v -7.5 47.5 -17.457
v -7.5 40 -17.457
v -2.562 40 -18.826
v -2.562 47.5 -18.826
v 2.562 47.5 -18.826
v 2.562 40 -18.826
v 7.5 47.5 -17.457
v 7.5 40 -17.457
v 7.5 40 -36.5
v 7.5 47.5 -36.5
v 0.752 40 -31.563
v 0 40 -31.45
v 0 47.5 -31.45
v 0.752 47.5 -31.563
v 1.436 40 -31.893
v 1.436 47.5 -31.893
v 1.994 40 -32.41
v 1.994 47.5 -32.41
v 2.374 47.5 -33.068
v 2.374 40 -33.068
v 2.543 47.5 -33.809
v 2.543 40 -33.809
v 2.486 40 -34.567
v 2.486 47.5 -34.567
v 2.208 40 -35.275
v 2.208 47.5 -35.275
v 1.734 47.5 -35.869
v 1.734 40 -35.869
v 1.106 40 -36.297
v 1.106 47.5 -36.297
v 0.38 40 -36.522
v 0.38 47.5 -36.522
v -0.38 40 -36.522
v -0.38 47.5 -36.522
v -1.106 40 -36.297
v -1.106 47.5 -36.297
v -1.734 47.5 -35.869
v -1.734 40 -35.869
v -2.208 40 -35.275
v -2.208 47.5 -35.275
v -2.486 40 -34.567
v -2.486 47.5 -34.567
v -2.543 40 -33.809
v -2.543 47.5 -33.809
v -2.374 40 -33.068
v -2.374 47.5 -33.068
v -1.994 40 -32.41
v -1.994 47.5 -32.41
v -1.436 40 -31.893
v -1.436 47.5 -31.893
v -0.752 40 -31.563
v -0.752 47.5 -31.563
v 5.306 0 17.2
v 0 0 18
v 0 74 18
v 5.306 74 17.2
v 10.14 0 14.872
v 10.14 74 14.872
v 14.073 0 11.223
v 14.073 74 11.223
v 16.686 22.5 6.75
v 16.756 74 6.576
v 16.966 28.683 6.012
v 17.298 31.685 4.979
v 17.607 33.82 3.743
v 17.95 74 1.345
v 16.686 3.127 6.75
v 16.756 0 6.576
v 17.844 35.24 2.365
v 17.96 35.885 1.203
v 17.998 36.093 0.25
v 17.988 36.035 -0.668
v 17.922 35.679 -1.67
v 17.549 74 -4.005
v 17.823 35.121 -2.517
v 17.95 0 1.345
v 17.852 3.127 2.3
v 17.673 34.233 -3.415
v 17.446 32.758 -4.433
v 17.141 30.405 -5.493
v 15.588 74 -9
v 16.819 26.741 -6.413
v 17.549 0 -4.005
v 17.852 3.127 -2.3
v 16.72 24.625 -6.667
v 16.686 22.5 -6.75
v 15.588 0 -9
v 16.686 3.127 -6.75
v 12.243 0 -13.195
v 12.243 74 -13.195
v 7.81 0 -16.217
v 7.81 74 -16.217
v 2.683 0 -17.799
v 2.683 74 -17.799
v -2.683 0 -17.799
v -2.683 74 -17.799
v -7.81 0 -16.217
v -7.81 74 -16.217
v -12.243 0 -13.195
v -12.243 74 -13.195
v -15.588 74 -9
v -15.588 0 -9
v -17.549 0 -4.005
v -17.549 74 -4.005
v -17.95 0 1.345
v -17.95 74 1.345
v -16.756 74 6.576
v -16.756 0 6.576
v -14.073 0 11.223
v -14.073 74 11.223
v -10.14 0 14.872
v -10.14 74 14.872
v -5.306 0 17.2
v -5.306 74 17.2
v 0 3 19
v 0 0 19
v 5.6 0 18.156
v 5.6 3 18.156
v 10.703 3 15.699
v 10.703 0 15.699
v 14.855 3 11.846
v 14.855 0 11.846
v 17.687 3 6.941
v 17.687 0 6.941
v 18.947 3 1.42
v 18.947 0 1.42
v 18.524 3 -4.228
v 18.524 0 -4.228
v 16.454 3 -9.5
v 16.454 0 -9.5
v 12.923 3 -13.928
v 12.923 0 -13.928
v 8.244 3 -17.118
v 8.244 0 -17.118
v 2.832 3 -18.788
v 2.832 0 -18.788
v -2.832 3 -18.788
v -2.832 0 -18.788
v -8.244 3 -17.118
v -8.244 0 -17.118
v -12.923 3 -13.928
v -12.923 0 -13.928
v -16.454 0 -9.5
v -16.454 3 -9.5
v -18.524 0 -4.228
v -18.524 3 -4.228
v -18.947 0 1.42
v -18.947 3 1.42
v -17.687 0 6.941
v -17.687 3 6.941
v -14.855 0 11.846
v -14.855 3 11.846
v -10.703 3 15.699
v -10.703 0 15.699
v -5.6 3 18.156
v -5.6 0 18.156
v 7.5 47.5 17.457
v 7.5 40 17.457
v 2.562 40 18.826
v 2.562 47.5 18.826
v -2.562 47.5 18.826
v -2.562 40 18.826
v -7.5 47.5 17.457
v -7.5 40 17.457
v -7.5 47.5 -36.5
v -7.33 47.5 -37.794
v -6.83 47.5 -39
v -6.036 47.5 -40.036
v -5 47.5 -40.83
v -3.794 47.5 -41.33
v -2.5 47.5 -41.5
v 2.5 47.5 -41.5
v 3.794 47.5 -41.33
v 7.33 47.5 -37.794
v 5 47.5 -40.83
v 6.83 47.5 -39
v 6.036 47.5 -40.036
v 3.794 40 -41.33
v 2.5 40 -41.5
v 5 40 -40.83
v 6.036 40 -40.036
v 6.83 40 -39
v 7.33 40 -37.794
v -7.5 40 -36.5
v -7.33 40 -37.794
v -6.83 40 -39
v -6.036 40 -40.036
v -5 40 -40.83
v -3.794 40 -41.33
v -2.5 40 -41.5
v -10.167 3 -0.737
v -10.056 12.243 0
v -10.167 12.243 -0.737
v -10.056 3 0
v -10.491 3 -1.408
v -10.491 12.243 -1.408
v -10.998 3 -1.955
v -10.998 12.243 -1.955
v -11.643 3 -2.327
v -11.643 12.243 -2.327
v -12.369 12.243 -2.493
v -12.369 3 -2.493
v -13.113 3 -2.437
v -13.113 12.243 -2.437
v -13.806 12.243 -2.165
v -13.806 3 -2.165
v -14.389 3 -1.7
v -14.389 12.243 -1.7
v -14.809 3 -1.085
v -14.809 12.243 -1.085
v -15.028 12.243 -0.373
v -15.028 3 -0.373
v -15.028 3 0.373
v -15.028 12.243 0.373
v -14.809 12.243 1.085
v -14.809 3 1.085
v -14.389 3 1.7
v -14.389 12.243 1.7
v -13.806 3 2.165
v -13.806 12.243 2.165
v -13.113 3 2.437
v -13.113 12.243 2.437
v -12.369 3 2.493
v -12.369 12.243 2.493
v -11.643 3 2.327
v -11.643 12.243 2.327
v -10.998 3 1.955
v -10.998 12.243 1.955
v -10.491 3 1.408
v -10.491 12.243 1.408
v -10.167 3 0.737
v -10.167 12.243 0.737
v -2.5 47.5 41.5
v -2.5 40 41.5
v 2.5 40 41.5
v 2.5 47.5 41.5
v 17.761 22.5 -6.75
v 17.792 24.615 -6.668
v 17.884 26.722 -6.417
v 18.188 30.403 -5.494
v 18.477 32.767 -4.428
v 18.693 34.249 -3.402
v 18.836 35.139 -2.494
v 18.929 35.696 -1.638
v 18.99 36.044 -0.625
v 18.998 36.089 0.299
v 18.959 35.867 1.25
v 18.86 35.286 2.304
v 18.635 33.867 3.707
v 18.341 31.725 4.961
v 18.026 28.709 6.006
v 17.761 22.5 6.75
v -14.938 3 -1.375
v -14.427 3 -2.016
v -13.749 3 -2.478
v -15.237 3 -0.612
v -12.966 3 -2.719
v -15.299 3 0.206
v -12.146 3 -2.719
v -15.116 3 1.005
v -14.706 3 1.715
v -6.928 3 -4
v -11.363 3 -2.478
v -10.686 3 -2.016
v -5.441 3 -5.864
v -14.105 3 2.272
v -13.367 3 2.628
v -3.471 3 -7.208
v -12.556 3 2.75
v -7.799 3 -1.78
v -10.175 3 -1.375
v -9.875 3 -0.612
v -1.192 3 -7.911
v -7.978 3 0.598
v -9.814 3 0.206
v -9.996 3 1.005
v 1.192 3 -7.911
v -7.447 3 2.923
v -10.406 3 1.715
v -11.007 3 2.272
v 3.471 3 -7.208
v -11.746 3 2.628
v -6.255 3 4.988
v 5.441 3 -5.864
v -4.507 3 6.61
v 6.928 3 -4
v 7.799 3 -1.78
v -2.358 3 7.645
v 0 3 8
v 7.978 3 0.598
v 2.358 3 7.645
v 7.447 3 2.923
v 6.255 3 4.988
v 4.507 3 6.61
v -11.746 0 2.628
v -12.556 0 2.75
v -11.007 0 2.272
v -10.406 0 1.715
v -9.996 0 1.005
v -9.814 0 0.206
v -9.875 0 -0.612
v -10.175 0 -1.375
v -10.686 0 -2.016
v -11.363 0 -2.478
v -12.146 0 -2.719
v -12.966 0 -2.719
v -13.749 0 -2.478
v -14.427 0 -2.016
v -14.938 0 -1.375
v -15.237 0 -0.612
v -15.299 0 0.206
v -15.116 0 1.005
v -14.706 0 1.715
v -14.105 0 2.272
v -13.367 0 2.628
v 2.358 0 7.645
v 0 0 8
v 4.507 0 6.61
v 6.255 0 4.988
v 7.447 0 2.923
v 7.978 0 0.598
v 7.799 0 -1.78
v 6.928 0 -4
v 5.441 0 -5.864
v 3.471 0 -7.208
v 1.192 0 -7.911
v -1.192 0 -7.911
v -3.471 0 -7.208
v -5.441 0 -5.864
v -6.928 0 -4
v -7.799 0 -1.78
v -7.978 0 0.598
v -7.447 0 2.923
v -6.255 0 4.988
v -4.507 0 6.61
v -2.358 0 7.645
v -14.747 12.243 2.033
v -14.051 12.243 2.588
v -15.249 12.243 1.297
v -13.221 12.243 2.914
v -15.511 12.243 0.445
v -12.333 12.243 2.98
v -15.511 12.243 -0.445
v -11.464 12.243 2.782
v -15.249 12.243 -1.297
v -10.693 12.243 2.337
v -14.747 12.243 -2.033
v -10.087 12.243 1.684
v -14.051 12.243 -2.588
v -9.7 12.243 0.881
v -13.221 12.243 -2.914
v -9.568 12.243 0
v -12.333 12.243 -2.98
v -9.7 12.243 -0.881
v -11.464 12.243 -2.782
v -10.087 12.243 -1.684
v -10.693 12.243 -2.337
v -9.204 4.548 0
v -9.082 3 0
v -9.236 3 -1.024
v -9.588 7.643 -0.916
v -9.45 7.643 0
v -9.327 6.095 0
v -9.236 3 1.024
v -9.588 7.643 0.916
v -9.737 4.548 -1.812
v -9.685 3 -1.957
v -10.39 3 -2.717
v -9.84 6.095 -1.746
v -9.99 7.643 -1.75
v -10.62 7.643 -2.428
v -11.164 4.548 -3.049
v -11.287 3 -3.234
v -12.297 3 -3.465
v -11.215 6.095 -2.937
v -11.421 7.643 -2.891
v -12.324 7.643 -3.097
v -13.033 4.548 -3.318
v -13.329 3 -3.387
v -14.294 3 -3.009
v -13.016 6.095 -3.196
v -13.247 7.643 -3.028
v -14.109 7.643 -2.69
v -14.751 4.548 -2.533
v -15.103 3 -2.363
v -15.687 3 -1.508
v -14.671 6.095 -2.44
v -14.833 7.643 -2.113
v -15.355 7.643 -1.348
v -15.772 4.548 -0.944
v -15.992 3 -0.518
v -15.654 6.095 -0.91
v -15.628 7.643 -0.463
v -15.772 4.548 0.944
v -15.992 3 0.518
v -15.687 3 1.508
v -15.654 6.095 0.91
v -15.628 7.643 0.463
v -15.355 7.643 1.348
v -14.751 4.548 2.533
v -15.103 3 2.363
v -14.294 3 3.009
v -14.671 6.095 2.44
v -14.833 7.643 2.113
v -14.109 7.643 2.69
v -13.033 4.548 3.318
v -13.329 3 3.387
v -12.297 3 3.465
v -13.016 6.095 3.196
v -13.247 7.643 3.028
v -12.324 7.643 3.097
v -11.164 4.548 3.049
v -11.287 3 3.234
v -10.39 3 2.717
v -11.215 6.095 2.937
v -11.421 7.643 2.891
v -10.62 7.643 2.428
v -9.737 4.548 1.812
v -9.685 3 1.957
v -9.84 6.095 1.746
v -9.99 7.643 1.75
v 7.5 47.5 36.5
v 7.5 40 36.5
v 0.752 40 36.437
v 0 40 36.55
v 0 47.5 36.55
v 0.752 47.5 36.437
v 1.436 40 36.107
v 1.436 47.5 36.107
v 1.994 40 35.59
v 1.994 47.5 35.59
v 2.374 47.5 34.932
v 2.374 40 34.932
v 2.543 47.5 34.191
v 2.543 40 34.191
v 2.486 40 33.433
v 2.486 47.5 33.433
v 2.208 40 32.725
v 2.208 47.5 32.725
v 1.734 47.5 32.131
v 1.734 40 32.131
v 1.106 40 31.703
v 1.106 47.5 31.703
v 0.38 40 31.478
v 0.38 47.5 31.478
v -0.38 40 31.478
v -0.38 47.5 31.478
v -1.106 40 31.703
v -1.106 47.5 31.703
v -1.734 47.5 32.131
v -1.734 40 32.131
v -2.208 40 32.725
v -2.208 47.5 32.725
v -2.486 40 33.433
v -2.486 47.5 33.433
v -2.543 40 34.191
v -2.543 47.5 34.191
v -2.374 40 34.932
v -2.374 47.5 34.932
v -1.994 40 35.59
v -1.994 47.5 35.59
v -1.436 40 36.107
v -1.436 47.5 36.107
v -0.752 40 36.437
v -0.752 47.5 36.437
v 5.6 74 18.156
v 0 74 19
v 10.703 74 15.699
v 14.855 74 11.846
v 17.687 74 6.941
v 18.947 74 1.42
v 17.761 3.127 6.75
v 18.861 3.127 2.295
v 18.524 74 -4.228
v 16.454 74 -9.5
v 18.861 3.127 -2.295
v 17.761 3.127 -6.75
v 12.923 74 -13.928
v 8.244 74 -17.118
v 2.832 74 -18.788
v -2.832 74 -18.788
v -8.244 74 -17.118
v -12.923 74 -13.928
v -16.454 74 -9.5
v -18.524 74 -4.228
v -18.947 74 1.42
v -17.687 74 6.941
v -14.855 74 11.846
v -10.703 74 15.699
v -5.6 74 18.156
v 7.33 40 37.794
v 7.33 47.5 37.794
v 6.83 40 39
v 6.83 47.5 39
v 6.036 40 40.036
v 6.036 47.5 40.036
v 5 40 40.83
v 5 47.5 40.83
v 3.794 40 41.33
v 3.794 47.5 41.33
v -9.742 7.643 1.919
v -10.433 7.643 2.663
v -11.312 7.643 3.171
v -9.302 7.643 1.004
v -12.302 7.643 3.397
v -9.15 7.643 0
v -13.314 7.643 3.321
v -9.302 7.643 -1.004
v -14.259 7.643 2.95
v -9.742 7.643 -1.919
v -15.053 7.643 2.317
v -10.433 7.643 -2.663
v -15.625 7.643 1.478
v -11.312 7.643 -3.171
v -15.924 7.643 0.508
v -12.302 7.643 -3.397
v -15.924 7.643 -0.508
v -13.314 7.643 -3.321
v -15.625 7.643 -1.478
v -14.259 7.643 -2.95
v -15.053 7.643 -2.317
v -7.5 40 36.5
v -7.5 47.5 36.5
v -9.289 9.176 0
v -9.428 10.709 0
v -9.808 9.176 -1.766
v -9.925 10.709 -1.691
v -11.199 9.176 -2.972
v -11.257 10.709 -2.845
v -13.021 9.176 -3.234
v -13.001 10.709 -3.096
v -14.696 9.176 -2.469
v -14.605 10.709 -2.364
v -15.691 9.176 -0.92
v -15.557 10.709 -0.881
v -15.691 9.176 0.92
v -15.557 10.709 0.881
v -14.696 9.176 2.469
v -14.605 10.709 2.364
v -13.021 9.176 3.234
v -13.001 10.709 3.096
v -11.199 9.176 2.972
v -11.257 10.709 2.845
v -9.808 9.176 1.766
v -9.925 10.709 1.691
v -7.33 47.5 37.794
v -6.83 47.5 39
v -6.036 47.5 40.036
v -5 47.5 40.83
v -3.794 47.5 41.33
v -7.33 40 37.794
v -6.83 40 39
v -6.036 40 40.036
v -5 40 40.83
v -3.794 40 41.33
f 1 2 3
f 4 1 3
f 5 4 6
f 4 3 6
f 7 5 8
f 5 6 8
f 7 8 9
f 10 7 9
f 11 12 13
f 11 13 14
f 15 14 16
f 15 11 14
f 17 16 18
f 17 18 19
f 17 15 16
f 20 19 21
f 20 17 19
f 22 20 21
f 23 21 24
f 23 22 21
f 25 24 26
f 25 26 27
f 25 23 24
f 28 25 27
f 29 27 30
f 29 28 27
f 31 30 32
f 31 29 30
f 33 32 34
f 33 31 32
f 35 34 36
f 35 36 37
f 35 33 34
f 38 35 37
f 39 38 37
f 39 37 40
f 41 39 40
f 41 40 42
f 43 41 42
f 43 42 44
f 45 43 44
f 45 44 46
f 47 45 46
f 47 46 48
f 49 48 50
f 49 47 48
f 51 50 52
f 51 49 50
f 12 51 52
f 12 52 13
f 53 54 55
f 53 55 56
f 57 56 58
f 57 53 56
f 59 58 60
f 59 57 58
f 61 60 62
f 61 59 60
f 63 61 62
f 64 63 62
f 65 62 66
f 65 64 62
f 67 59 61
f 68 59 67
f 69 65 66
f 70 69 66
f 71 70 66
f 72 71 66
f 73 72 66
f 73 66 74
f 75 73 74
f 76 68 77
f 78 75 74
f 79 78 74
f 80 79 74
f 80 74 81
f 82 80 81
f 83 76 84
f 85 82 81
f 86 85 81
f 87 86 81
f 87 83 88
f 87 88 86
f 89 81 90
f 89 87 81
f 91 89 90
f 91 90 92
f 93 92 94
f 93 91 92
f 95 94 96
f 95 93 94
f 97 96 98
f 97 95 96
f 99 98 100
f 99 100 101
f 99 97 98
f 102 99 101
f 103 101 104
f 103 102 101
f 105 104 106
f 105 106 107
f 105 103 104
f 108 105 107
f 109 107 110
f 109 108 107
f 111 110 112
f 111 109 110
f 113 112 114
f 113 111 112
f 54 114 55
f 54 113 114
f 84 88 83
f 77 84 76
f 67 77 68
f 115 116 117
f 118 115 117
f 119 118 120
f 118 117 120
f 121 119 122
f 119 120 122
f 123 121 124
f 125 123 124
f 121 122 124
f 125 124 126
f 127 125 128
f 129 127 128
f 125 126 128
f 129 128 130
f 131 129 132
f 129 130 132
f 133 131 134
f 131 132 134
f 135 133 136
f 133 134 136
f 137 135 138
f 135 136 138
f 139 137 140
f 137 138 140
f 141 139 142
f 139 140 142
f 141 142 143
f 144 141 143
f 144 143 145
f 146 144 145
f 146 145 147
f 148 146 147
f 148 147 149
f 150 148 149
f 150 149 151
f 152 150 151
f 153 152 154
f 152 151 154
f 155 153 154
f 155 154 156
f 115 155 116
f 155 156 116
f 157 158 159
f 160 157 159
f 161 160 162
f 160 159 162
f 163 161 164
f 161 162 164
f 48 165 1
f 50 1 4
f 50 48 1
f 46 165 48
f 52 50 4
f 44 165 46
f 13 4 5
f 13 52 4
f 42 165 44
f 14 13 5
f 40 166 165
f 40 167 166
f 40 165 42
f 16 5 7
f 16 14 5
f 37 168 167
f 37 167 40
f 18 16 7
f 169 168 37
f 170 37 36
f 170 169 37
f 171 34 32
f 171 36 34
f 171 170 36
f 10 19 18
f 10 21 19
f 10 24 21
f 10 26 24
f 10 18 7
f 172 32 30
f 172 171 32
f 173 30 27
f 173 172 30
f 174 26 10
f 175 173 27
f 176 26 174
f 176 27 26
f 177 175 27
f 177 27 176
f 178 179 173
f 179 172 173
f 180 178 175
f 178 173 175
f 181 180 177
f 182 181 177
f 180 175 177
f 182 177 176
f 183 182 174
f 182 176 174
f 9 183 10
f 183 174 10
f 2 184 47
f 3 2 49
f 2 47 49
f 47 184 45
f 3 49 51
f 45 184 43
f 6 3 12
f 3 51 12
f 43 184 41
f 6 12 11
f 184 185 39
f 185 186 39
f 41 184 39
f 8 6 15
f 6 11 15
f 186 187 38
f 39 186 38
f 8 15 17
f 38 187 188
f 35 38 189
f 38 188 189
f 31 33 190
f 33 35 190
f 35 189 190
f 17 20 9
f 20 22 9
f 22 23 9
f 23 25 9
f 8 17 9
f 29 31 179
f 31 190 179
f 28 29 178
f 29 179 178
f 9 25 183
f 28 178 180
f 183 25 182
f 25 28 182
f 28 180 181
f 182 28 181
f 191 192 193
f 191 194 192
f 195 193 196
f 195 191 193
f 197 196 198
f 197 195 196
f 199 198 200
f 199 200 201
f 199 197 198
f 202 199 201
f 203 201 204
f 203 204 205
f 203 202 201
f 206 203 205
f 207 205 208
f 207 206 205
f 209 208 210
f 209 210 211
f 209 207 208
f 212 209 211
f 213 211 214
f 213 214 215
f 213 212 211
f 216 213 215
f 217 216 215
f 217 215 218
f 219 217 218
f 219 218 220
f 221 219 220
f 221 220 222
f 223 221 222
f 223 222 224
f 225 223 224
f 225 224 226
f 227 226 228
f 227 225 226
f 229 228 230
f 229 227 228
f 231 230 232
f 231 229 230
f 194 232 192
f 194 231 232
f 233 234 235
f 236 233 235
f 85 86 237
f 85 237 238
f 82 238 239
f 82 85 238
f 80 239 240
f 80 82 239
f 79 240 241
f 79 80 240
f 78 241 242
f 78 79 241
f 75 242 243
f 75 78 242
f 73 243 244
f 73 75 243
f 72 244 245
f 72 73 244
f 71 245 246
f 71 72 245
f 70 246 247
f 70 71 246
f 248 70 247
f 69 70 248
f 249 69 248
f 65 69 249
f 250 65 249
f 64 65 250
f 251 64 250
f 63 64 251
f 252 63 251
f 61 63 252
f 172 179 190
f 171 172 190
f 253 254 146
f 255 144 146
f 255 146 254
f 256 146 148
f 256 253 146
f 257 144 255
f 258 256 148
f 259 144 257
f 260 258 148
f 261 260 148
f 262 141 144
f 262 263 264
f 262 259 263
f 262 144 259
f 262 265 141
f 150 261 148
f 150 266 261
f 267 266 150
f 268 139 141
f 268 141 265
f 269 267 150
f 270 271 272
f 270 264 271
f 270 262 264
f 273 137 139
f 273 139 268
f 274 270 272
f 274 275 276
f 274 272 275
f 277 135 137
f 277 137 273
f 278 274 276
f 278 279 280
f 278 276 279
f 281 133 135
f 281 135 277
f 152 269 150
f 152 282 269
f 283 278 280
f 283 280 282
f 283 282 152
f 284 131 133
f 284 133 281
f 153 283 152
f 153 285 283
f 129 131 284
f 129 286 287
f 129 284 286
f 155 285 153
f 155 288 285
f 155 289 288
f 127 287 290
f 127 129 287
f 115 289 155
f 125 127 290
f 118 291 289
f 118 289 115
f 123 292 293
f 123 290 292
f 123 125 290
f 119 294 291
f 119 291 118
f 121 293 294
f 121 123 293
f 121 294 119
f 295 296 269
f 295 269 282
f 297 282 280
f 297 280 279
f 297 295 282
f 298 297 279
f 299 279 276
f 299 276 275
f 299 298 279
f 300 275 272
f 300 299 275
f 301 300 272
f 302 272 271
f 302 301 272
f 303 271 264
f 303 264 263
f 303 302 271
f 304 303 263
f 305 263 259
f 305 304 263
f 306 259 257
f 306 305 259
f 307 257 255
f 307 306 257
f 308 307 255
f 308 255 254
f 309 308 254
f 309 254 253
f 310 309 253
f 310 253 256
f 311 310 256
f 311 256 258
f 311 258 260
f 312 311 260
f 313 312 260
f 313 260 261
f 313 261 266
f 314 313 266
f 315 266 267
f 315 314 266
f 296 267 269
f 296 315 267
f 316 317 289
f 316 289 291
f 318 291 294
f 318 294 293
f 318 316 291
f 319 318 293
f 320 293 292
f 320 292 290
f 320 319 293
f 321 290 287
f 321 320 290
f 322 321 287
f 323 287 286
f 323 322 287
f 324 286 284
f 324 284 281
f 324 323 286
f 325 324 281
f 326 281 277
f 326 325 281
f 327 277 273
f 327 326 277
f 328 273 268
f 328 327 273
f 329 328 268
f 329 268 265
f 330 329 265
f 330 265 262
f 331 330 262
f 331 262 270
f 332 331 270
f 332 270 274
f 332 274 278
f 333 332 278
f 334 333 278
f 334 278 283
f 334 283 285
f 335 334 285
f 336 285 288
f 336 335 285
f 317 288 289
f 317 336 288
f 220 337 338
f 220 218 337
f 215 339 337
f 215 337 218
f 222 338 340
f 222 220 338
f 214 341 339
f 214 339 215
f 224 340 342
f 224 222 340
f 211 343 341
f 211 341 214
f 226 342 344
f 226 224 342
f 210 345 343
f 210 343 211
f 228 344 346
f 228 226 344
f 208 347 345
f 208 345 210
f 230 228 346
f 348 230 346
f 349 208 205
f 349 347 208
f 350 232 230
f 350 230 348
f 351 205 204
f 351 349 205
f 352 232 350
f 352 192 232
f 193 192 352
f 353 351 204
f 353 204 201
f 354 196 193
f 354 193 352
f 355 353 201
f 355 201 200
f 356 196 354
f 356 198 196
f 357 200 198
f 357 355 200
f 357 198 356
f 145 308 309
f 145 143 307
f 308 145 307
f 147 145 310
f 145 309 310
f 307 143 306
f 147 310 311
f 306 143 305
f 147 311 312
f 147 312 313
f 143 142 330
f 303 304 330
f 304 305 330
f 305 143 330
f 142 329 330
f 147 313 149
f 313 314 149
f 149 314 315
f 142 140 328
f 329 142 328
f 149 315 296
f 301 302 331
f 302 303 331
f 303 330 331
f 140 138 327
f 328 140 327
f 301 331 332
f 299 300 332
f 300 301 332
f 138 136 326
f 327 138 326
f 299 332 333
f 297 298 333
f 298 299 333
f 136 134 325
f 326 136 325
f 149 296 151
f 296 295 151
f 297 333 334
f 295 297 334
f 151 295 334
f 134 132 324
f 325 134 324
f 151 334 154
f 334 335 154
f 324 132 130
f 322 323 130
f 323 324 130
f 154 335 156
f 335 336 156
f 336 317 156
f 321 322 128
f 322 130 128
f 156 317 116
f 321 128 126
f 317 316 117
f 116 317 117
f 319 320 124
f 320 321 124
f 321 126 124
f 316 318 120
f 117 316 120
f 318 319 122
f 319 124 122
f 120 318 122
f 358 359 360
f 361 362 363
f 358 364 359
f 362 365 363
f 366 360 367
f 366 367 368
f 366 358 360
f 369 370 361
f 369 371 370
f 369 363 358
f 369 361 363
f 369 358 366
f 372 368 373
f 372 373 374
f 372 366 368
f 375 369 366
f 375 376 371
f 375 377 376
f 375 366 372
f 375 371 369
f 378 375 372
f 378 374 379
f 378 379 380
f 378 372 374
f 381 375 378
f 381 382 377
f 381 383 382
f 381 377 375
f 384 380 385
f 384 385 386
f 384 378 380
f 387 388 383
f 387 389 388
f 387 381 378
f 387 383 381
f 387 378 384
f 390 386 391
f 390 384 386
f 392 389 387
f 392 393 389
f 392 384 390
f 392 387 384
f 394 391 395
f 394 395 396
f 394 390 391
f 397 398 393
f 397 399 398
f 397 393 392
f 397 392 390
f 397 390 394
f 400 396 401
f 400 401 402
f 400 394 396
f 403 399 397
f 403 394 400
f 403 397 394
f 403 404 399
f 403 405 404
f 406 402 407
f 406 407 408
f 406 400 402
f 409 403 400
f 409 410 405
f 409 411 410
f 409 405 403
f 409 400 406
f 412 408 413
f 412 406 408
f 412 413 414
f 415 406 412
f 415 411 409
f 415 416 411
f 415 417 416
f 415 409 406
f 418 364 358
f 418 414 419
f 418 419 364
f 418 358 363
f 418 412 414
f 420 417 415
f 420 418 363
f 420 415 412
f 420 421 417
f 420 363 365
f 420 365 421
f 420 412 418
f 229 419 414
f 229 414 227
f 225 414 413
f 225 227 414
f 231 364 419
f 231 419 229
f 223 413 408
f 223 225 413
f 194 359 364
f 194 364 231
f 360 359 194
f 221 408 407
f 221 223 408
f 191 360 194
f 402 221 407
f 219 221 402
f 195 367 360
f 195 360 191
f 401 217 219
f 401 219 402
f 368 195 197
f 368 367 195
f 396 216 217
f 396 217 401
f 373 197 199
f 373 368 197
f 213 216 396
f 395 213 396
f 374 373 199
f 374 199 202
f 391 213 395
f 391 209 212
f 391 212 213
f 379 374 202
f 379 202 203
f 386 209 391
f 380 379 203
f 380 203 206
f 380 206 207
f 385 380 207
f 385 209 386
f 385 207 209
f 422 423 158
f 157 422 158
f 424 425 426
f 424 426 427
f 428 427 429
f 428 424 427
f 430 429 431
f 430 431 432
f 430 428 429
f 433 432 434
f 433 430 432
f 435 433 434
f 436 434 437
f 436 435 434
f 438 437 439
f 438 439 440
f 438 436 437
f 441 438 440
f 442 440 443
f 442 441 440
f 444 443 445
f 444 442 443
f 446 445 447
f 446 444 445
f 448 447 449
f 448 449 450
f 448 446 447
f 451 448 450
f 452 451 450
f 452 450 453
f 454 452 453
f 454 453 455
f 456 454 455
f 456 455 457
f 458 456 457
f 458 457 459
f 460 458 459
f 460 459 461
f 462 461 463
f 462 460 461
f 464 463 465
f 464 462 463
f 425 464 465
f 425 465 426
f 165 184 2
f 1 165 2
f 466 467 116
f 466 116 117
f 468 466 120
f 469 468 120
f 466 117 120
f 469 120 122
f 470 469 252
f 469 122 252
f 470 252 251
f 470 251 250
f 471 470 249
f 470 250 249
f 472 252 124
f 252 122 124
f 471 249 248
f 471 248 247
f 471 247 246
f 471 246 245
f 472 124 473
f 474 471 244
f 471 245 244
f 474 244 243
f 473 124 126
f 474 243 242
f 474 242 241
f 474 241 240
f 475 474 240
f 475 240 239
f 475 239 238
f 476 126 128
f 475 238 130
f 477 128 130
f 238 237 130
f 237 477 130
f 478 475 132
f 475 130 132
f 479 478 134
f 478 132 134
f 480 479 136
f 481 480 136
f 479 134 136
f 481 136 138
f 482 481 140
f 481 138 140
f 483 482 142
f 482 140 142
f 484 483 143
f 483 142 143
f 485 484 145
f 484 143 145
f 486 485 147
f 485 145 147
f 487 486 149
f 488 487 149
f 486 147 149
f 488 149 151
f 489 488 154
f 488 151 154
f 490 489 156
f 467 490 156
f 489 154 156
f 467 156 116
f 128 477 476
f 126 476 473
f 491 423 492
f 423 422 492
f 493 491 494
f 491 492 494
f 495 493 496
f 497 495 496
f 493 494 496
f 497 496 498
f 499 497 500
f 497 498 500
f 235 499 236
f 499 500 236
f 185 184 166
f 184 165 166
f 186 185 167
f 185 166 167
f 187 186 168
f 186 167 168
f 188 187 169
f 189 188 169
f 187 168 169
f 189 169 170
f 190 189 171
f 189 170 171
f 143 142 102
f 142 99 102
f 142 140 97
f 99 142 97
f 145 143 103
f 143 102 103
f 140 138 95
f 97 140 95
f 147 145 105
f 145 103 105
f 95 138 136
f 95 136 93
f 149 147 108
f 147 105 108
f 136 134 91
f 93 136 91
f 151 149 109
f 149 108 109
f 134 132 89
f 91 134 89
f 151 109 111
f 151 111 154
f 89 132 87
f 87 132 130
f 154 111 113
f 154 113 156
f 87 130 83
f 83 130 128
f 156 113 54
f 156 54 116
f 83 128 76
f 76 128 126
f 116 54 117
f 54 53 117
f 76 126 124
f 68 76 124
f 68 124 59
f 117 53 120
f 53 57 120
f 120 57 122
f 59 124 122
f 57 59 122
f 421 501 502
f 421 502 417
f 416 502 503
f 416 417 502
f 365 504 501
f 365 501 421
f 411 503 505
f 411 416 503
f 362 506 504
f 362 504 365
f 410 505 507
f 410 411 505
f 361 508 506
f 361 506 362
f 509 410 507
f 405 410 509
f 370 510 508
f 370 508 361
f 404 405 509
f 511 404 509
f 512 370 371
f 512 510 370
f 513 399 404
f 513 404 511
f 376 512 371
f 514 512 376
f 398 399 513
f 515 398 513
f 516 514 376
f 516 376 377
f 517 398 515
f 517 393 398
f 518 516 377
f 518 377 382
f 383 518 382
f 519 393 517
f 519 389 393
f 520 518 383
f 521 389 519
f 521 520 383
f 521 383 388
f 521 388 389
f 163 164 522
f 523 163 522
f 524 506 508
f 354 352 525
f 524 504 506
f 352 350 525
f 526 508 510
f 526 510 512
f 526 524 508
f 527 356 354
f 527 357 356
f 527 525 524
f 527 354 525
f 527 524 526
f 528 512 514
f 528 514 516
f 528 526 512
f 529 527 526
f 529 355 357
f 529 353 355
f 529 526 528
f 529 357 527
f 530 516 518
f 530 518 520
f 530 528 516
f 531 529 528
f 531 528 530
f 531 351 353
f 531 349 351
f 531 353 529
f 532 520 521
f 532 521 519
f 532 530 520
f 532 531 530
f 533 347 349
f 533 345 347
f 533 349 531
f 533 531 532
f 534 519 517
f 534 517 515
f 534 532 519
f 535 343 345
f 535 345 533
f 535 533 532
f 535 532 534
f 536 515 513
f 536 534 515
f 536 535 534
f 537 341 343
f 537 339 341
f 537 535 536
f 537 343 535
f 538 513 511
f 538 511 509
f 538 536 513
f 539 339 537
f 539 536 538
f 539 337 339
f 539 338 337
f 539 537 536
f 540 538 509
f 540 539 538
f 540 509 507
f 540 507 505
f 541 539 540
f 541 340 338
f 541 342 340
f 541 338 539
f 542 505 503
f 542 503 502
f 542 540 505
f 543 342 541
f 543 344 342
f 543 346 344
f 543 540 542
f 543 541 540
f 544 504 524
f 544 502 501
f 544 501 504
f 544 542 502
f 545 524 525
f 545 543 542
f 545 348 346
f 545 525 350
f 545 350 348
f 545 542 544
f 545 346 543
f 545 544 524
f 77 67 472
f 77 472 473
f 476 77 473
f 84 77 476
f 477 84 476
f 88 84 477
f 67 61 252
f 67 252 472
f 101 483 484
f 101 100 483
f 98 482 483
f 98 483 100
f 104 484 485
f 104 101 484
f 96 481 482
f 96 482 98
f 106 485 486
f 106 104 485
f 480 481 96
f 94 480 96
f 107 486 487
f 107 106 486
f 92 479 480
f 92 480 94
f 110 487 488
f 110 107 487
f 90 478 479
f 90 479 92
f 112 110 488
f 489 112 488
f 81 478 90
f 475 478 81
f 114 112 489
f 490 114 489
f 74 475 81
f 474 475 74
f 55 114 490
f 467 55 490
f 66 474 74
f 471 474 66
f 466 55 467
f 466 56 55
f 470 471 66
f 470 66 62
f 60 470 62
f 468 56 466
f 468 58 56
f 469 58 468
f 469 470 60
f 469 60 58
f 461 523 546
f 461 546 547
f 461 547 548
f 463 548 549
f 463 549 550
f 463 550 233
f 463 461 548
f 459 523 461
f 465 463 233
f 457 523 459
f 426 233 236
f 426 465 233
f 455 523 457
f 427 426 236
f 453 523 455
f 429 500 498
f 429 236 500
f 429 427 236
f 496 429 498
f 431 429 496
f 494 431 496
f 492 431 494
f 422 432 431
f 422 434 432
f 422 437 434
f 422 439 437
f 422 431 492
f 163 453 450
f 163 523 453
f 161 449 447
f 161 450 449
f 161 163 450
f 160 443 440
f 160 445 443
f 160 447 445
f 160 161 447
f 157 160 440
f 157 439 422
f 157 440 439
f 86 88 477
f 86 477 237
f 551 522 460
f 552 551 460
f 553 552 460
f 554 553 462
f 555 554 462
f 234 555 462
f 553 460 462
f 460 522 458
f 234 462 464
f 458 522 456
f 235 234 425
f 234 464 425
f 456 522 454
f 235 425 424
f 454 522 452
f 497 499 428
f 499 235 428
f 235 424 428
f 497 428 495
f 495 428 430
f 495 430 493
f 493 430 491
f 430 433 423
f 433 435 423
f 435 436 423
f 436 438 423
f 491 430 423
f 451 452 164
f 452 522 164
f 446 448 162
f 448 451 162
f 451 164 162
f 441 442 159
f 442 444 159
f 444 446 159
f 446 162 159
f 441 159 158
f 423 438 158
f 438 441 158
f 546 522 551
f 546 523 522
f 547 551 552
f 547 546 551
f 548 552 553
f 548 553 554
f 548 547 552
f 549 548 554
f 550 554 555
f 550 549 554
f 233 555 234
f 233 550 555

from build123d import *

# Parameters (mm, degrees)
SKETCH1_R             = 19
SKETCH1_R_2           = 2.75
SKETCH1_R_3           = 8
BOSS_EXTRUDE1_DEPTH   = 3
SKETCH1_5_R           = 19
SKETCH1_5_R_2         = 18
BOSS_EXTRUDE2_DEPTH   = 74
CUT_EXTRUDE1_DEPTH    = 79.727377703
SKETCH3_R             = 2.55
BOSS_EXTRUDE3_DEPTH   = 7.5
BOSS_EXTRUDE3_2_DEPTH = 7.5
BODY_MOVE_COPY1_ANGLE = 90
FILLET3_R             = 5
FILLET4_R             = 5


with BuildPart() as part:
    # Sketch1 → Boss-Extrude1 (new body)
    with BuildSketch(Plane(origin=(0, 0, 0), x_dir=(1, 0, 0), z_dir=(0, 1, 0))):
        with Locations(Location((0, 0, 0), (0, 0, 270))):
            Circle(SKETCH1_R)
        with Locations(Location((-12.55625, 0, 0), (0, 0, 270))):
            Circle(SKETCH1_R_2, mode=Mode.SUBTRACT)
        with Locations(Location((0, 0, 0), (0, 0, 270))):
            Circle(SKETCH1_R_3, mode=Mode.SUBTRACT)
    extrude(amount=BOSS_EXTRUDE1_DEPTH)


with BuildPart() as body_2:
    # Sketch1<5> → Boss-Extrude2 (new body)
    with BuildSketch(Plane(origin=(0, 0, 0), x_dir=(1, 0, 0), z_dir=(0, 1, 0))):
        with Locations(Location((0, 0, 0), (0, 0, 270))):
            Circle(SKETCH1_5_R)
        with Locations(Location((0, 0, 0), (0, 0, 270))):
            Circle(SKETCH1_5_R_2, mode=Mode.SUBTRACT)
    extrude(amount=BOSS_EXTRUDE2_DEPTH)

    # Sketch2 → Cut-Extrude1 (cut, through all)
    with BuildSketch(Plane(origin=(0, 0, 0), x_dir=(0, 0, -1), z_dir=(1, 0, 0))):
        with BuildLine():
            Line((-6.75, 22.5), (-6.75, 3.126681013))
            Line((-6.75, 3.126681013), (6.75, 3.126681013))
            Line((6.75, 3.126681013), (6.75, 22.5))
            add(Edge.make_bspline(
                [(6.75, 22.5), (6.75, 36.102227394), (0, 36.102227394), (-6.75, 36.102227394), (-6.75, 22.5)],
                knots=[4.71238898, 4.71238898, 4.71238898, 6.283185307, 6.283185307, 7.853981634, 7.853981634, 7.853981634], degree=2, weights=[1, 0.707106781, 1, 0.707106781, 1]))
        make_face()
    extrude(amount=CUT_EXTRUDE1_DEPTH, mode=Mode.SUBTRACT)


with BuildPart() as body_3:
    # Sketch3 → Boss-Extrude3 (new body)
    with BuildSketch(Plane(origin=(0, 40, 0), x_dir=(1, 0, 0), z_dir=(0, 1, 0))):
        with BuildLine():
            Line((-7.5, 41.5), (-7.5, 17.45709025))
            ThreePointArc((-7.5, 17.45709025), (0, 19), (7.5, 17.45709025))
            Line((7.5, 17.45709025), (7.5, 41.5))
            Line((7.5, 41.5), (-7.5, 41.5))
        make_face()
        with Locations(Location((0, 34, 0), (0, 0, 270))):
            Circle(SKETCH3_R, mode=Mode.SUBTRACT)
    extrude(amount=BOSS_EXTRUDE3_DEPTH)

    # Fillet4
    fillet4_edges = [body_3.edges().sort_by_distance(p)[0] for p in [
        (-7.5, 43.75, -41.5),
        (7.5, 43.75, -41.5),
    ]]
    fillet(fillet4_edges, radius=FILLET4_R)


with BuildPart() as body_4:
    # Sketch3 → Boss-Extrude3 2 (new body)
    with BuildSketch(Plane(origin=(0, 40, 0), x_dir=(1, 0, 0), z_dir=(0, 1, 0))):
        with BuildLine():
            ThreePointArc((7.5, -17.45709025), (0, -19), (-7.5, -17.45709025))
            Line((-7.5, -17.45709025), (-7.5, -41.5))
            Line((-7.5, -41.5), (7.5, -41.5))
            Line((7.5, -41.5), (7.5, -17.45709025))
        make_face()
        with Locations(Location((0, -34, 0), (0, 0, 270))):
            Circle(SKETCH3_R, mode=Mode.SUBTRACT)
    extrude(amount=BOSS_EXTRUDE3_2_DEPTH)

    # Fillet3
    fillet3_edges = [body_4.edges().sort_by_distance(p)[0] for p in [
        (7.5, 43.75, 41.5),
        (-7.5, 43.75, 41.5),
    ]]
    fillet(fillet3_edges, radius=FILLET3_R)


with BuildPart() as body_5:
    # barbfitting_mcmaster5218K688_V6: read off the stored shape, not the designer's step
    # barbfitting_mcmaster5218K688_V6 outline → barbfitting_mcmaster5218K688_V6 (revolve)
    with BuildSketch(Plane(origin=(-6.358056722, 31.008138883, 0), x_dir=(1, 0, 0), z_dir=(0, -1, 0))):
        Polygon((2.988629913, 1.192484738), (2.5, 1.192484738), (2.5, -8.050028229), (3.474601768, -8.050028229), (3.106067413, -3.407296512), (3.406067413, -3.407296512), align=None)
    revolve(axis=Axis((-6.358056722, 31.008138883, 0), (0, 0, 1)))


with BuildPart() as body_5_1:
    # Body-Move/Copy1: moved
    add(body_5.part.rotate(Axis((0, 31.008138883, -3.428771746), (-1, 0, 0)), BODY_MOVE_COPY1_ANGLE))


with BuildPart() as body_5_2:
    # Body-Move/Copy2: read off the stored shape, not the designer's step
    # Body-Move/Copy2: moved
    add(body_5_1.part.moved(Location((-6.1981933, -23.3868824, 3.4287717))))


solid = Compound([part.part, body_2.part, body_3.part, body_4.part, body_5_2.part])
